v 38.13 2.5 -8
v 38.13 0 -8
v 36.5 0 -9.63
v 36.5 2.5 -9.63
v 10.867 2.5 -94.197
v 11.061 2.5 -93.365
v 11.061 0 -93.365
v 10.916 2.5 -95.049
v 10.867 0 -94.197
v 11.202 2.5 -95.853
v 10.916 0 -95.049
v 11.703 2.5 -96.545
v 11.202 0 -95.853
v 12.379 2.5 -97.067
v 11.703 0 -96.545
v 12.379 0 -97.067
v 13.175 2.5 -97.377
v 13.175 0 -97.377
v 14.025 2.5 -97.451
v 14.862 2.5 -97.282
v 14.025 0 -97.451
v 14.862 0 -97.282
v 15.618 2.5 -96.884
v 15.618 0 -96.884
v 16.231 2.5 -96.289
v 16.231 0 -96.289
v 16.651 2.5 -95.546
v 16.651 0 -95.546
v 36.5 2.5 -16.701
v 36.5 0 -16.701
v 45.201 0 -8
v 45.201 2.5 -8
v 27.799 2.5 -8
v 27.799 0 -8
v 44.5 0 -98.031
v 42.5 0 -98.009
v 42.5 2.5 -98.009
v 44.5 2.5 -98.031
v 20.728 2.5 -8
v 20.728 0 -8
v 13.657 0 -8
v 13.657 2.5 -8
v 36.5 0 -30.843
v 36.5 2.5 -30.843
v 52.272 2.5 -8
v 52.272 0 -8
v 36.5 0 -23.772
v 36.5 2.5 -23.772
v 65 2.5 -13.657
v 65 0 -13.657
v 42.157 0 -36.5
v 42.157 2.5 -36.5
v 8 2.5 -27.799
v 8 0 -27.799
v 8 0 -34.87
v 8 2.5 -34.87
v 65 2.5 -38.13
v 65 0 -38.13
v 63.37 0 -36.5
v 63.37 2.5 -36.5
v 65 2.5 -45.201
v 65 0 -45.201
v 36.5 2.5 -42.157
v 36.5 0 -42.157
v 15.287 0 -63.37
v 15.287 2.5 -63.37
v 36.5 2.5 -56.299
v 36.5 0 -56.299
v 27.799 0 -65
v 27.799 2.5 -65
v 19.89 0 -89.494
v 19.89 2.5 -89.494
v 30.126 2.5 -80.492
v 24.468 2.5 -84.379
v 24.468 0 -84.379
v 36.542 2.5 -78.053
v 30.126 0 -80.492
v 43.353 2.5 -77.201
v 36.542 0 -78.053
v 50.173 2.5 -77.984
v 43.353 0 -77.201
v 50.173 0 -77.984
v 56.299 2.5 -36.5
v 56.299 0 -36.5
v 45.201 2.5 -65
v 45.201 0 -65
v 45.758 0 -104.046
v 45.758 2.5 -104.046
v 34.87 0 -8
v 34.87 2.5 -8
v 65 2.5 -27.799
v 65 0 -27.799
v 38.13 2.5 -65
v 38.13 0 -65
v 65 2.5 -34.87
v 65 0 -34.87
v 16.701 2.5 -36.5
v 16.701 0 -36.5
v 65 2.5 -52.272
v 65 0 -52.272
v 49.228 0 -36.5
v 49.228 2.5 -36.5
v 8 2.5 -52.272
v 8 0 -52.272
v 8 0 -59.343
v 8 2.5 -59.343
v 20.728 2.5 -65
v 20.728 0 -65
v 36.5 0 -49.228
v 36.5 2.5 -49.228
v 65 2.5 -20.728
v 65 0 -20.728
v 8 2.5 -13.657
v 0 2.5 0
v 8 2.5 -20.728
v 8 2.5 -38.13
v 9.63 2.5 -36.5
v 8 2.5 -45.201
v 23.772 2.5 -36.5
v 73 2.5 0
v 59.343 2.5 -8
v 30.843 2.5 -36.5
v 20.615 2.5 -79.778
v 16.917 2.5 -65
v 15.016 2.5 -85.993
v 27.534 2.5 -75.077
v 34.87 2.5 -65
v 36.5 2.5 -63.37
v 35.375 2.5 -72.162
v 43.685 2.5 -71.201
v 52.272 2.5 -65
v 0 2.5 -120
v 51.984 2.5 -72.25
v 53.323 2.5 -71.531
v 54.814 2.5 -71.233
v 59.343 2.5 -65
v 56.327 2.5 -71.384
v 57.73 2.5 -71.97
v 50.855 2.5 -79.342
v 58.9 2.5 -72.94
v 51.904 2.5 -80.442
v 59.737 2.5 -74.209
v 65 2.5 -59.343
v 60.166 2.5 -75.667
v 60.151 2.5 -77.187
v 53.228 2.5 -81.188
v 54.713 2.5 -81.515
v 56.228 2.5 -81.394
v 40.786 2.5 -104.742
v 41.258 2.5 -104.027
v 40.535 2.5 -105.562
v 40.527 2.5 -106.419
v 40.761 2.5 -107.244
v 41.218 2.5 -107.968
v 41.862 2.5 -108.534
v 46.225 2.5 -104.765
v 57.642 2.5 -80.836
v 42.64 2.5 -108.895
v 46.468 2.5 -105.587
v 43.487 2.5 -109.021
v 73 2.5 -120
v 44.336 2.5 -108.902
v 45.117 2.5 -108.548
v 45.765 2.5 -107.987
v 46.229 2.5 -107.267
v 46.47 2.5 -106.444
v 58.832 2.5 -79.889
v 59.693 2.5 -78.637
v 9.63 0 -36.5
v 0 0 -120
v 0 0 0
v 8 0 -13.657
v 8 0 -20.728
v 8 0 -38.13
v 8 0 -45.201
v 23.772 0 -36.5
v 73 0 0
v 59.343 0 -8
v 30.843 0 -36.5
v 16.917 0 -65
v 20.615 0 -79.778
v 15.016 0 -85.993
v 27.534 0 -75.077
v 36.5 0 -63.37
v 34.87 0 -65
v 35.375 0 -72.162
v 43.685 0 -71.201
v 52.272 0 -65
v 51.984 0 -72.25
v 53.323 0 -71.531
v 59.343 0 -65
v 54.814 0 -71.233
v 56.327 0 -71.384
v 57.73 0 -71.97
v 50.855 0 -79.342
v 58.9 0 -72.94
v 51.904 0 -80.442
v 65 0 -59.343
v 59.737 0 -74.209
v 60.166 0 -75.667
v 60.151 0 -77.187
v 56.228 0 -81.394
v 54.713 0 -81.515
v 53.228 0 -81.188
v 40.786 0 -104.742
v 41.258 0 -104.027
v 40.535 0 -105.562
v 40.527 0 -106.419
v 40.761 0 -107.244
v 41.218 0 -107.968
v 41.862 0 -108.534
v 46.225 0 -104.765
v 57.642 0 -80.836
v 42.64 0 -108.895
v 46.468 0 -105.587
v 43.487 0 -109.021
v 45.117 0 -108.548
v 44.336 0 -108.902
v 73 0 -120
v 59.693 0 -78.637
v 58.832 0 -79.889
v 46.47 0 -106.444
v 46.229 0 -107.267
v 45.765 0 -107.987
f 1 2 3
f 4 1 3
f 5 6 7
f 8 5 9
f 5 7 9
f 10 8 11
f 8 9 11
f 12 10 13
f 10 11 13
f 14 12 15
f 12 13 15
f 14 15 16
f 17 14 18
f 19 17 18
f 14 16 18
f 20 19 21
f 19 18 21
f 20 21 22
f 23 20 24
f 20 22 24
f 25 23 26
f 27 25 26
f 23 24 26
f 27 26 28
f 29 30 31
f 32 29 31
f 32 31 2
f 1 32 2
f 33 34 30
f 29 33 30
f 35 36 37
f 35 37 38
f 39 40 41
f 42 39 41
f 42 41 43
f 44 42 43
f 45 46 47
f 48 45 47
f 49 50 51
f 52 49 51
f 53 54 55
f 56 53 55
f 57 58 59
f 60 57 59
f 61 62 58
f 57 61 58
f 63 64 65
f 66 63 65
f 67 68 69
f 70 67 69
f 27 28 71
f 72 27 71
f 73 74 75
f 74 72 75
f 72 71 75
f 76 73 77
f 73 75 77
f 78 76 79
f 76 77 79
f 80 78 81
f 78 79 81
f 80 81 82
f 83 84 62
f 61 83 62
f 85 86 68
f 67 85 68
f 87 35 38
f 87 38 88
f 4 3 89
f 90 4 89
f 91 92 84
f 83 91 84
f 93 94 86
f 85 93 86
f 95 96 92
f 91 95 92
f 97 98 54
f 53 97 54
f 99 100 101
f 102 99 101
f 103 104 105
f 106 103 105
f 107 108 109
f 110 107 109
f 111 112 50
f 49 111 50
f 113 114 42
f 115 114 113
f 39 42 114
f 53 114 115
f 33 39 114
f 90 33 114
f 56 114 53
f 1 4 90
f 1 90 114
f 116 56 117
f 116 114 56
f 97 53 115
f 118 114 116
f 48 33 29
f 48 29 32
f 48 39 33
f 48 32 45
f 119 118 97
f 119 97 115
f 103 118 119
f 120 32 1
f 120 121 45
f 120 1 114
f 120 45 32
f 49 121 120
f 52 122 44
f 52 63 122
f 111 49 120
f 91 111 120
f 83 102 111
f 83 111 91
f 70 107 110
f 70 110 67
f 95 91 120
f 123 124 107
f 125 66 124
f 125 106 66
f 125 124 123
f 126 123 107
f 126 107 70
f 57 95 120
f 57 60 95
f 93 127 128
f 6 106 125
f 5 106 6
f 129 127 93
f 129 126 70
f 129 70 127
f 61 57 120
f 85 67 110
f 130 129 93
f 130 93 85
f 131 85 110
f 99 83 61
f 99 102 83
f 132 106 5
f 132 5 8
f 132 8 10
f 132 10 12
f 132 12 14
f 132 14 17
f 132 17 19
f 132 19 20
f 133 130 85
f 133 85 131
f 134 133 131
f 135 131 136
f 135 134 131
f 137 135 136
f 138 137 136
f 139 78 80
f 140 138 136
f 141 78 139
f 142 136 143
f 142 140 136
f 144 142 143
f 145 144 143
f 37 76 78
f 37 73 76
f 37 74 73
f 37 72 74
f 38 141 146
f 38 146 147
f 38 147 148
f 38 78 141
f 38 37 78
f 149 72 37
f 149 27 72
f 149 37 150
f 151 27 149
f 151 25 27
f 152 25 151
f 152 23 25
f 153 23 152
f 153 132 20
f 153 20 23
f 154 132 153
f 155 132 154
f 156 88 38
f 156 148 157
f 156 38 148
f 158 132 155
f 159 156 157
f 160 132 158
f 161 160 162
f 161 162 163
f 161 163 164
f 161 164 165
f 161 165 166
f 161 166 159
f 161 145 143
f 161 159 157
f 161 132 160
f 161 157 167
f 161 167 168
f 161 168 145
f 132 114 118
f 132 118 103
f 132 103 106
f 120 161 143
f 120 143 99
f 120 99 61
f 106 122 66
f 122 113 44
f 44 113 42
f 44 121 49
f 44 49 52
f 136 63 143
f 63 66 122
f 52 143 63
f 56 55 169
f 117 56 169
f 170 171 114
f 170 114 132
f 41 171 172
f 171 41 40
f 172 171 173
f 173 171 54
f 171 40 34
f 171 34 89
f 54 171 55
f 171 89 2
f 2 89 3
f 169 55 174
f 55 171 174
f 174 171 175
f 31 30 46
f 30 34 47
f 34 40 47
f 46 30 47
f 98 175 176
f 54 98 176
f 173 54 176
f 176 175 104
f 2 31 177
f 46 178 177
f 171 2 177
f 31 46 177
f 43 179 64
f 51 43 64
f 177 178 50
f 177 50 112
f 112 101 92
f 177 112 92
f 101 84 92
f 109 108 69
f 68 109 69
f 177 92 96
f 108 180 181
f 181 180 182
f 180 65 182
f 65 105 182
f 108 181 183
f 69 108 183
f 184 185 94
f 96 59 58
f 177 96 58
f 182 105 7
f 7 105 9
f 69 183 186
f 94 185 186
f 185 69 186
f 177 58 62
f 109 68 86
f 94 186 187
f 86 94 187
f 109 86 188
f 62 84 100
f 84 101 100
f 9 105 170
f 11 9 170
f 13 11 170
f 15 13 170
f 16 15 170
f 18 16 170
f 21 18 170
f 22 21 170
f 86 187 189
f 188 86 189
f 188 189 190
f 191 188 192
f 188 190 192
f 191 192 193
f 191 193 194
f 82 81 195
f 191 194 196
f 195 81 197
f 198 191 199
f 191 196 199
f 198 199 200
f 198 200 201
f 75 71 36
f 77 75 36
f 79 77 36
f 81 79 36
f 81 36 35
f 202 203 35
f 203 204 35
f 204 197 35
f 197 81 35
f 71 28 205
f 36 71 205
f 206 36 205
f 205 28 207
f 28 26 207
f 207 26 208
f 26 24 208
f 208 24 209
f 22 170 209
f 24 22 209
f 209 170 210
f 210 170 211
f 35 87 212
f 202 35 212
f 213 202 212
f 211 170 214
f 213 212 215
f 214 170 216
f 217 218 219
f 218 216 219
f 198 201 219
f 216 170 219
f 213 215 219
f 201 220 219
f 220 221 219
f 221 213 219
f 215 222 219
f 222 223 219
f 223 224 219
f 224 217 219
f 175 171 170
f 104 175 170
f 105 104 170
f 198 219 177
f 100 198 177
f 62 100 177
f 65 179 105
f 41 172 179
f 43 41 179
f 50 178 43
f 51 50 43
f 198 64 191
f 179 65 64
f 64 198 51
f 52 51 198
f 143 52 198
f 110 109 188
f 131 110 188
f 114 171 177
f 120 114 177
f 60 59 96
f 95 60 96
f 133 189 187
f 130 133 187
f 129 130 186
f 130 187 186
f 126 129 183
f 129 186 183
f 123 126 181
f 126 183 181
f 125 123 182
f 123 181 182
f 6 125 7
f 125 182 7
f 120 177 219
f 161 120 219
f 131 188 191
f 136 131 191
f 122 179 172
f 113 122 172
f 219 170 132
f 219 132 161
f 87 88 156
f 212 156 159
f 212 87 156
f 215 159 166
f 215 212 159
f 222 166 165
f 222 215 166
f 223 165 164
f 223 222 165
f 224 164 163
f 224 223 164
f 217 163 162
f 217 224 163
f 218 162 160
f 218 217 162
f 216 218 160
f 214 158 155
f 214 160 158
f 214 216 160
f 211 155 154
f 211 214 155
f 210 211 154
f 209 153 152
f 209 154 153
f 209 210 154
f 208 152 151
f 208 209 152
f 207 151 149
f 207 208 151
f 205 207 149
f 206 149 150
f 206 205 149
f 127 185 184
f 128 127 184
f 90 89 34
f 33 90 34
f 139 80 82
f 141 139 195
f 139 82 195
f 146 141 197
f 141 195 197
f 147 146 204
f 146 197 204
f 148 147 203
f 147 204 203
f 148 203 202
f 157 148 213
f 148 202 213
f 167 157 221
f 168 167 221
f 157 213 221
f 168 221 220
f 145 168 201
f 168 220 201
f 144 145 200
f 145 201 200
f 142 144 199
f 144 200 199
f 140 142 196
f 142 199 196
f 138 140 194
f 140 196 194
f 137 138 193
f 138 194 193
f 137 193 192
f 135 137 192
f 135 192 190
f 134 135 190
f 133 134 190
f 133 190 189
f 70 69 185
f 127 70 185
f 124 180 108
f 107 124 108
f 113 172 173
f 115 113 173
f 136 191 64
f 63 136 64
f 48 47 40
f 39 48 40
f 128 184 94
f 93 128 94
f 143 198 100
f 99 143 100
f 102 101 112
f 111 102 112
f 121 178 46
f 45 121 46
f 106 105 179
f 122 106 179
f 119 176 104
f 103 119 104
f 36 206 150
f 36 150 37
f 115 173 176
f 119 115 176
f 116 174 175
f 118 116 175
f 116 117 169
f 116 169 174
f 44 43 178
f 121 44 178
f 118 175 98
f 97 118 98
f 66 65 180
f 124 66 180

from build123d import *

# Parameters (mm, degrees)
IZIM1_W                     = 73
IZIM1_H                     = 120
Y_KSEKLIK_EKSTR_ZYON1_DEPTH = 2.5
KES_EKSTR_ZYON2_DEPTH       = 3.5
IZIM5_R                     = 3
KES_EKSTR_ZYON3_DEPTH       = 3.5
IZIM6_R                     = 5.15
KES_EKSTR_ZYON4_DEPTH       = 3.5
KES_EKSTR_ZYON5_DEPTH       = 3.5


with BuildPart() as part:
    # Çizim1 → Yükseklik-Ekstrüzyon1 (new body)
    with BuildSketch(Plane(origin=(0, 0, 0), x_dir=(1, 0, 0), z_dir=(0, 1, 0))):
        with Locations((36.5, 60)):
            Rectangle(IZIM1_W, IZIM1_H)
    extrude(amount=Y_KSEKLIK_EKSTR_ZYON1_DEPTH)

    # Çizim4 → Kes-Ekstrüzyon2 (cut, through all)
    with BuildSketch(Plane.XZ):
        with BuildLine():
            Line((41.258359694, -104.027018589), (42.500062903, -98.009051571))
            Line((42.500062903, -98.009051571), (44.499937097, -98.031483944))
            Line((44.499937097, -98.031483944), (45.758359694, -104.045976978))
            ThreePointArc((45.758359694, -104.045976978), (43.487361186, -109.020744393), (41.258359694, -104.027018589))
        make_face()
    extrude(amount=-KES_EKSTR_ZYON2_DEPTH, mode=Mode.SUBTRACT)

    # Çizim5 → Kes-Ekstrüzyon3 (cut, through all)
    with BuildSketch(Plane.XZ):
        with Locations((13.856266363, -94.455359404)):
            Circle(IZIM5_R)
        with BuildLine():
            ThreePointArc((53.975019366, -79.171862015), (52.270586975, -75.286645133), (56.155803858, -73.582212742))
            ThreePointArc((56.155803858, -73.582212742), (29.511480202, -74.134241759), (11.061441726, -93.364967158))
            ThreePointArc((11.061441726, -93.364967158), (14.411030317, -91.507099417), (16.856266363, -94.455359404))
            ThreePointArc((16.856266363, -94.455359404), (16.804526351, -95.010123359), (16.651091, -95.54575165))
            ThreePointArc((16.651091, -95.54575165), (31.921911605, -79.628768168), (53.975019366, -79.171862015))
        make_face()
        with Locations((55.065411612, -76.377037379)):
            Circle(IZIM5_R)
    extrude(amount=-KES_EKSTR_ZYON3_DEPTH, mode=Mode.SUBTRACT)

    # Çizim6 → Kes-Ekstrüzyon4 (cut, through all)
    with BuildSketch(Plane.XZ):
        with Locations((55.065411612, -76.377037379)):
            Circle(IZIM6_R)
    extrude(amount=-KES_EKSTR_ZYON4_DEPTH, mode=Mode.SUBTRACT)

    # Çizim7 → Kes-Ekstrüzyon5 (cut, through all)
    with BuildSketch(Plane.XZ):
        Polygon((16.916738879, -65), (20.727922061, -65), (22.357864376, -63.370057685), (18.82233047, -59.834523779), (15.286796564, -63.370057685), align=None)
        Polygon((22.357864376, -63.370057685), (25.893398282, -59.834523779), (22.357864376, -56.298989873), (18.82233047, -59.834523779), align=None)
        Polygon((25.893398282, -59.834523779), (29.428932188, -56.298989873), (25.893398282, -52.763455967), (22.357864376, -56.298989873), align=None)
        Polygon((29.428932188, -56.298989873), (32.964466094, -52.763455967), (29.428932188, -49.227922061), (25.893398282, -52.763455967), align=None)
        Polygon((32.964466094, -52.763455967), (36.5, -49.227922061), (32.964466094, -45.692388155), (29.428932188, -49.227922061), align=None)
        Polygon((36.5, -49.227922061), (40.035533906, -45.692388155), (36.5, -42.156854249), (32.964466094, -45.692388155), align=None)
        Polygon((40.035533906, -52.763455967), (43.571067812, -49.227922061), (40.035533906, -45.692388155), (36.5, -49.227922061), align=None)
        Polygon((43.571067812, -56.298989873), (47.106601718, -52.763455967), (43.571067812, -49.227922061), (40.035533906, -52.763455967), align=None)
        Polygon((47.106601718, -59.834523779), (50.642135624, -56.298989873), (47.106601718, -52.763455967), (43.571067812, -56.298989873), align=None)
        Polygon((50.642135624, -63.370057685), (54.17766953, -59.834523779), (50.642135624, -56.298989873), (47.106601718, -59.834523779), align=None)
        Polygon((52.272077939, -65), (56.083261121, -65), (57.713203436, -63.370057685), (54.17766953, -59.834523779), (50.642135624, -63.370057685), align=None)
        Polygon((56.083261121, -65), (59.343145751, -65), (57.713203436, -63.370057685), align=None)
        Polygon((41.941125497, -65), (45.201010127, -65), (43.571067812, -63.370057685), align=None)
        Polygon((38.129942315, -65), (41.941125497, -65), (43.571067812, -63.370057685), (40.035533906, -59.834523779), (36.5, -63.370057685), align=None)
        Polygon((36.5, -63.370057685), (40.035533906, -59.834523779), (36.5, -56.298989873), (32.964466094, -59.834523779), align=None)
        Polygon((31.058874503, -65), (34.870057685, -65), (36.5, -63.370057685), (32.964466094, -59.834523779), (29.428932188, -63.370057685), align=None)
        Polygon((27.798989873, -65), (31.058874503, -65), (29.428932188, -63.370057685), align=None)
        Polygon((8, -52.272077939), (8, -59.343145751), (13.165476221, -54.17766953), (9.629942315, -50.642135624), align=None)
        Polygon((9.629942315, -50.642135624), (13.165476221, -54.17766953), (16.701010127, -50.642135624), (13.165476221, -47.106601718), align=None)
        Polygon((13.165476221, -47.106601718), (16.701010127, -50.642135624), (20.236544033, -47.106601718), (16.701010127, -43.571067812), align=None)
        Polygon((16.701010127, -43.571067812), (20.236544033, -47.106601718), (23.772077939, -43.571067812), (20.236544033, -40.035533906), align=None)
        Polygon((20.236544033, -40.035533906), (23.772077939, -43.571067812), (27.307611845, -40.035533906), (23.772077939, -36.5), align=None)
        Polygon((23.772077939, -36.5), (27.307611845, -40.035533906), (30.843145751, -36.5), (27.307611845, -32.964466094), align=None)
        Polygon((20.236544033, -32.964466094), (23.772077939, -36.5), (27.307611845, -32.964466094), (23.772077939, -29.428932188), align=None)
        Polygon((16.701010127, -29.428932188), (20.236544033, -32.964466094), (23.772077939, -29.428932188), (20.236544033, -25.893398282), align=None)
        Polygon((13.165476221, -25.893398282), (16.701010127, -29.428932188), (20.236544033, -25.893398282), (16.701010127, -22.357864376), align=None)
        Polygon((9.629942315, -22.357864376), (13.165476221, -25.893398282), (16.701010127, -22.357864376), (13.165476221, -18.82233047), align=None)
        Polygon((8, -16.916738879), (8, -20.727922061), (9.629942315, -22.357864376), (13.165476221, -18.82233047), (9.629942315, -15.286796564), align=None)
        Polygon((8, -13.656854249), (8, -16.916738879), (9.629942315, -15.286796564), align=None)
        Polygon((8, -41.941125497), (8, -45.201010127), (9.629942315, -43.571067812), align=None)
        Polygon((8, -38.129942315), (8, -41.941125497), (9.629942315, -43.571067812), (13.165476221, -40.035533906), (9.629942315, -36.5), align=None)
        Polygon((9.629942315, -36.5), (13.165476221, -40.035533906), (16.701010127, -36.5), (13.165476221, -32.964466094), align=None)
        Polygon((8, -31.058874503), (8, -34.870057685), (9.629942315, -36.5), (13.165476221, -32.964466094), (9.629942315, -29.428932188), align=None)
        Polygon((8, -27.798989873), (8, -31.058874503), (9.629942315, -29.428932188), align=None)
        Polygon((63.370057685, -57.713203436), (65, -59.343145751), (65, -56.083261121), align=None)
        Polygon((63.370057685, -57.713203436), (65, -56.083261121), (65, -52.272077939), (63.370057685, -50.642135624), (59.834523779, -54.17766953), align=None)
        Polygon((56.298989873, -50.642135624), (59.834523779, -54.17766953), (63.370057685, -50.642135624), (59.834523779, -47.106601718), align=None)
        Polygon((52.763455967, -47.106601718), (56.298989873, -50.642135624), (59.834523779, -47.106601718), (56.298989873, -43.571067812), align=None)
        Polygon((49.227922061, -43.571067812), (52.763455967, -47.106601718), (56.298989873, -43.571067812), (52.763455967, -40.035533906), align=None)
        Polygon((45.692388155, -40.035533906), (49.227922061, -43.571067812), (52.763455967, -40.035533906), (49.227922061, -36.5), align=None)
        Polygon((42.156854249, -36.5), (45.692388155, -40.035533906), (49.227922061, -36.5), (45.692388155, -32.964466094), align=None)
        Polygon((45.692388155, -32.964466094), (49.227922061, -36.5), (52.763455967, -32.964466094), (49.227922061, -29.428932188), align=None)
        Polygon((49.227922061, -29.428932188), (52.763455967, -32.964466094), (56.298989873, -29.428932188), (52.763455967, -25.893398282), align=None)
        Polygon((52.763455967, -25.893398282), (56.298989873, -29.428932188), (59.834523779, -25.893398282), (56.298989873, -22.357864376), align=None)
        Polygon((56.298989873, -22.357864376), (59.834523779, -25.893398282), (63.370057685, -22.357864376), (59.834523779, -18.82233047), align=None)
        Polygon((63.370057685, -22.357864376), (65, -20.727922061), (65, -13.656854249), (59.834523779, -18.82233047), align=None)
        Polygon((56.298989873, -36.5), (59.834523779, -40.035533906), (63.370057685, -36.5), (59.834523779, -32.964466094), align=None)
        Polygon((63.370057685, -43.571067812), (65, -41.941125497), (65, -38.129942315), (63.370057685, -36.5), (59.834523779, -40.035533906), align=None)
        Polygon((63.370057685, -36.5), (65, -34.870057685), (65, -31.058874503), (63.370057685, -29.428932188), (59.834523779, -32.964466094), align=None)
        Polygon((63.370057685, -29.428932188), (65, -31.058874503), (65, -27.798989873), align=None)
        Polygon((63.370057685, -43.571067812), (65, -45.201010127), (65, -41.941125497), align=None)
        Polygon((22.357864376, -9.629942315), (20.727922061, -8), (13.656854249, -8), (18.82233047, -13.165476221), align=None)
        Polygon((22.357864376, -16.701010127), (25.893398282, -13.165476221), (22.357864376, -9.629942315), (18.82233047, -13.165476221), align=None)
        Polygon((25.893398282, -20.236544033), (29.428932188, -16.701010127), (25.893398282, -13.165476221), (22.357864376, -16.701010127), align=None)
        Polygon((29.428932188, -23.772077939), (32.964466094, -20.236544033), (29.428932188, -16.701010127), (25.893398282, -20.236544033), align=None)
        Polygon((32.964466094, -27.307611845), (36.5, -23.772077939), (32.964466094, -20.236544033), (29.428932188, -23.772077939), align=None)
        Polygon((40.035533906, -27.307611845), (43.571067812, -23.772077939), (40.035533906, -20.236544033), (36.5, -23.772077939), align=None)
        Polygon((43.571067812, -23.772077939), (47.106601718, -20.236544033), (43.571067812, -16.701010127), (40.035533906, -20.236544033), align=None)
        Polygon((47.106601718, -20.236544033), (50.642135624, -16.701010127), (47.106601718, -13.165476221), (43.571067812, -16.701010127), align=None)
        Polygon((50.642135624, -16.701010127), (54.17766953, -13.165476221), (50.642135624, -9.629942315), (47.106601718, -13.165476221), align=None)
        Polygon((57.713203436, -9.629942315), (56.083261121, -8), (52.272077939, -8), (50.642135624, -9.629942315), (54.17766953, -13.165476221), align=None)
        Polygon((43.571067812, -9.629942315), (41.941125497, -8), (38.129942315, -8), (36.5, -9.629942315), (40.035533906, -13.165476221), align=None)
        Polygon((36.5, -16.701010127), (40.035533906, -13.165476221), (36.5, -9.629942315), (32.964466094, -13.165476221), align=None)
        Polygon((36.5, -9.629942315), (34.870057685, -8), (31.058874503, -8), (29.428932188, -9.629942315), (32.964466094, -13.165476221), align=None)
        Polygon((57.713203436, -9.629942315), (59.343145751, -8), (56.083261121, -8), align=None)
        Polygon((29.428932188, -9.629942315), (31.058874503, -8), (27.798989873, -8), align=None)
        Polygon((36.5, -30.843145751), (40.035533906, -27.307611845), (36.5, -23.772077939), (32.964466094, -27.307611845), align=None)
        Polygon((43.571067812, -9.629942315), (45.201010127, -8), (41.941125497, -8), align=None)
    extrude(amount=-KES_EKSTR_ZYON5_DEPTH, mode=Mode.SUBTRACT)


solid = part.part
